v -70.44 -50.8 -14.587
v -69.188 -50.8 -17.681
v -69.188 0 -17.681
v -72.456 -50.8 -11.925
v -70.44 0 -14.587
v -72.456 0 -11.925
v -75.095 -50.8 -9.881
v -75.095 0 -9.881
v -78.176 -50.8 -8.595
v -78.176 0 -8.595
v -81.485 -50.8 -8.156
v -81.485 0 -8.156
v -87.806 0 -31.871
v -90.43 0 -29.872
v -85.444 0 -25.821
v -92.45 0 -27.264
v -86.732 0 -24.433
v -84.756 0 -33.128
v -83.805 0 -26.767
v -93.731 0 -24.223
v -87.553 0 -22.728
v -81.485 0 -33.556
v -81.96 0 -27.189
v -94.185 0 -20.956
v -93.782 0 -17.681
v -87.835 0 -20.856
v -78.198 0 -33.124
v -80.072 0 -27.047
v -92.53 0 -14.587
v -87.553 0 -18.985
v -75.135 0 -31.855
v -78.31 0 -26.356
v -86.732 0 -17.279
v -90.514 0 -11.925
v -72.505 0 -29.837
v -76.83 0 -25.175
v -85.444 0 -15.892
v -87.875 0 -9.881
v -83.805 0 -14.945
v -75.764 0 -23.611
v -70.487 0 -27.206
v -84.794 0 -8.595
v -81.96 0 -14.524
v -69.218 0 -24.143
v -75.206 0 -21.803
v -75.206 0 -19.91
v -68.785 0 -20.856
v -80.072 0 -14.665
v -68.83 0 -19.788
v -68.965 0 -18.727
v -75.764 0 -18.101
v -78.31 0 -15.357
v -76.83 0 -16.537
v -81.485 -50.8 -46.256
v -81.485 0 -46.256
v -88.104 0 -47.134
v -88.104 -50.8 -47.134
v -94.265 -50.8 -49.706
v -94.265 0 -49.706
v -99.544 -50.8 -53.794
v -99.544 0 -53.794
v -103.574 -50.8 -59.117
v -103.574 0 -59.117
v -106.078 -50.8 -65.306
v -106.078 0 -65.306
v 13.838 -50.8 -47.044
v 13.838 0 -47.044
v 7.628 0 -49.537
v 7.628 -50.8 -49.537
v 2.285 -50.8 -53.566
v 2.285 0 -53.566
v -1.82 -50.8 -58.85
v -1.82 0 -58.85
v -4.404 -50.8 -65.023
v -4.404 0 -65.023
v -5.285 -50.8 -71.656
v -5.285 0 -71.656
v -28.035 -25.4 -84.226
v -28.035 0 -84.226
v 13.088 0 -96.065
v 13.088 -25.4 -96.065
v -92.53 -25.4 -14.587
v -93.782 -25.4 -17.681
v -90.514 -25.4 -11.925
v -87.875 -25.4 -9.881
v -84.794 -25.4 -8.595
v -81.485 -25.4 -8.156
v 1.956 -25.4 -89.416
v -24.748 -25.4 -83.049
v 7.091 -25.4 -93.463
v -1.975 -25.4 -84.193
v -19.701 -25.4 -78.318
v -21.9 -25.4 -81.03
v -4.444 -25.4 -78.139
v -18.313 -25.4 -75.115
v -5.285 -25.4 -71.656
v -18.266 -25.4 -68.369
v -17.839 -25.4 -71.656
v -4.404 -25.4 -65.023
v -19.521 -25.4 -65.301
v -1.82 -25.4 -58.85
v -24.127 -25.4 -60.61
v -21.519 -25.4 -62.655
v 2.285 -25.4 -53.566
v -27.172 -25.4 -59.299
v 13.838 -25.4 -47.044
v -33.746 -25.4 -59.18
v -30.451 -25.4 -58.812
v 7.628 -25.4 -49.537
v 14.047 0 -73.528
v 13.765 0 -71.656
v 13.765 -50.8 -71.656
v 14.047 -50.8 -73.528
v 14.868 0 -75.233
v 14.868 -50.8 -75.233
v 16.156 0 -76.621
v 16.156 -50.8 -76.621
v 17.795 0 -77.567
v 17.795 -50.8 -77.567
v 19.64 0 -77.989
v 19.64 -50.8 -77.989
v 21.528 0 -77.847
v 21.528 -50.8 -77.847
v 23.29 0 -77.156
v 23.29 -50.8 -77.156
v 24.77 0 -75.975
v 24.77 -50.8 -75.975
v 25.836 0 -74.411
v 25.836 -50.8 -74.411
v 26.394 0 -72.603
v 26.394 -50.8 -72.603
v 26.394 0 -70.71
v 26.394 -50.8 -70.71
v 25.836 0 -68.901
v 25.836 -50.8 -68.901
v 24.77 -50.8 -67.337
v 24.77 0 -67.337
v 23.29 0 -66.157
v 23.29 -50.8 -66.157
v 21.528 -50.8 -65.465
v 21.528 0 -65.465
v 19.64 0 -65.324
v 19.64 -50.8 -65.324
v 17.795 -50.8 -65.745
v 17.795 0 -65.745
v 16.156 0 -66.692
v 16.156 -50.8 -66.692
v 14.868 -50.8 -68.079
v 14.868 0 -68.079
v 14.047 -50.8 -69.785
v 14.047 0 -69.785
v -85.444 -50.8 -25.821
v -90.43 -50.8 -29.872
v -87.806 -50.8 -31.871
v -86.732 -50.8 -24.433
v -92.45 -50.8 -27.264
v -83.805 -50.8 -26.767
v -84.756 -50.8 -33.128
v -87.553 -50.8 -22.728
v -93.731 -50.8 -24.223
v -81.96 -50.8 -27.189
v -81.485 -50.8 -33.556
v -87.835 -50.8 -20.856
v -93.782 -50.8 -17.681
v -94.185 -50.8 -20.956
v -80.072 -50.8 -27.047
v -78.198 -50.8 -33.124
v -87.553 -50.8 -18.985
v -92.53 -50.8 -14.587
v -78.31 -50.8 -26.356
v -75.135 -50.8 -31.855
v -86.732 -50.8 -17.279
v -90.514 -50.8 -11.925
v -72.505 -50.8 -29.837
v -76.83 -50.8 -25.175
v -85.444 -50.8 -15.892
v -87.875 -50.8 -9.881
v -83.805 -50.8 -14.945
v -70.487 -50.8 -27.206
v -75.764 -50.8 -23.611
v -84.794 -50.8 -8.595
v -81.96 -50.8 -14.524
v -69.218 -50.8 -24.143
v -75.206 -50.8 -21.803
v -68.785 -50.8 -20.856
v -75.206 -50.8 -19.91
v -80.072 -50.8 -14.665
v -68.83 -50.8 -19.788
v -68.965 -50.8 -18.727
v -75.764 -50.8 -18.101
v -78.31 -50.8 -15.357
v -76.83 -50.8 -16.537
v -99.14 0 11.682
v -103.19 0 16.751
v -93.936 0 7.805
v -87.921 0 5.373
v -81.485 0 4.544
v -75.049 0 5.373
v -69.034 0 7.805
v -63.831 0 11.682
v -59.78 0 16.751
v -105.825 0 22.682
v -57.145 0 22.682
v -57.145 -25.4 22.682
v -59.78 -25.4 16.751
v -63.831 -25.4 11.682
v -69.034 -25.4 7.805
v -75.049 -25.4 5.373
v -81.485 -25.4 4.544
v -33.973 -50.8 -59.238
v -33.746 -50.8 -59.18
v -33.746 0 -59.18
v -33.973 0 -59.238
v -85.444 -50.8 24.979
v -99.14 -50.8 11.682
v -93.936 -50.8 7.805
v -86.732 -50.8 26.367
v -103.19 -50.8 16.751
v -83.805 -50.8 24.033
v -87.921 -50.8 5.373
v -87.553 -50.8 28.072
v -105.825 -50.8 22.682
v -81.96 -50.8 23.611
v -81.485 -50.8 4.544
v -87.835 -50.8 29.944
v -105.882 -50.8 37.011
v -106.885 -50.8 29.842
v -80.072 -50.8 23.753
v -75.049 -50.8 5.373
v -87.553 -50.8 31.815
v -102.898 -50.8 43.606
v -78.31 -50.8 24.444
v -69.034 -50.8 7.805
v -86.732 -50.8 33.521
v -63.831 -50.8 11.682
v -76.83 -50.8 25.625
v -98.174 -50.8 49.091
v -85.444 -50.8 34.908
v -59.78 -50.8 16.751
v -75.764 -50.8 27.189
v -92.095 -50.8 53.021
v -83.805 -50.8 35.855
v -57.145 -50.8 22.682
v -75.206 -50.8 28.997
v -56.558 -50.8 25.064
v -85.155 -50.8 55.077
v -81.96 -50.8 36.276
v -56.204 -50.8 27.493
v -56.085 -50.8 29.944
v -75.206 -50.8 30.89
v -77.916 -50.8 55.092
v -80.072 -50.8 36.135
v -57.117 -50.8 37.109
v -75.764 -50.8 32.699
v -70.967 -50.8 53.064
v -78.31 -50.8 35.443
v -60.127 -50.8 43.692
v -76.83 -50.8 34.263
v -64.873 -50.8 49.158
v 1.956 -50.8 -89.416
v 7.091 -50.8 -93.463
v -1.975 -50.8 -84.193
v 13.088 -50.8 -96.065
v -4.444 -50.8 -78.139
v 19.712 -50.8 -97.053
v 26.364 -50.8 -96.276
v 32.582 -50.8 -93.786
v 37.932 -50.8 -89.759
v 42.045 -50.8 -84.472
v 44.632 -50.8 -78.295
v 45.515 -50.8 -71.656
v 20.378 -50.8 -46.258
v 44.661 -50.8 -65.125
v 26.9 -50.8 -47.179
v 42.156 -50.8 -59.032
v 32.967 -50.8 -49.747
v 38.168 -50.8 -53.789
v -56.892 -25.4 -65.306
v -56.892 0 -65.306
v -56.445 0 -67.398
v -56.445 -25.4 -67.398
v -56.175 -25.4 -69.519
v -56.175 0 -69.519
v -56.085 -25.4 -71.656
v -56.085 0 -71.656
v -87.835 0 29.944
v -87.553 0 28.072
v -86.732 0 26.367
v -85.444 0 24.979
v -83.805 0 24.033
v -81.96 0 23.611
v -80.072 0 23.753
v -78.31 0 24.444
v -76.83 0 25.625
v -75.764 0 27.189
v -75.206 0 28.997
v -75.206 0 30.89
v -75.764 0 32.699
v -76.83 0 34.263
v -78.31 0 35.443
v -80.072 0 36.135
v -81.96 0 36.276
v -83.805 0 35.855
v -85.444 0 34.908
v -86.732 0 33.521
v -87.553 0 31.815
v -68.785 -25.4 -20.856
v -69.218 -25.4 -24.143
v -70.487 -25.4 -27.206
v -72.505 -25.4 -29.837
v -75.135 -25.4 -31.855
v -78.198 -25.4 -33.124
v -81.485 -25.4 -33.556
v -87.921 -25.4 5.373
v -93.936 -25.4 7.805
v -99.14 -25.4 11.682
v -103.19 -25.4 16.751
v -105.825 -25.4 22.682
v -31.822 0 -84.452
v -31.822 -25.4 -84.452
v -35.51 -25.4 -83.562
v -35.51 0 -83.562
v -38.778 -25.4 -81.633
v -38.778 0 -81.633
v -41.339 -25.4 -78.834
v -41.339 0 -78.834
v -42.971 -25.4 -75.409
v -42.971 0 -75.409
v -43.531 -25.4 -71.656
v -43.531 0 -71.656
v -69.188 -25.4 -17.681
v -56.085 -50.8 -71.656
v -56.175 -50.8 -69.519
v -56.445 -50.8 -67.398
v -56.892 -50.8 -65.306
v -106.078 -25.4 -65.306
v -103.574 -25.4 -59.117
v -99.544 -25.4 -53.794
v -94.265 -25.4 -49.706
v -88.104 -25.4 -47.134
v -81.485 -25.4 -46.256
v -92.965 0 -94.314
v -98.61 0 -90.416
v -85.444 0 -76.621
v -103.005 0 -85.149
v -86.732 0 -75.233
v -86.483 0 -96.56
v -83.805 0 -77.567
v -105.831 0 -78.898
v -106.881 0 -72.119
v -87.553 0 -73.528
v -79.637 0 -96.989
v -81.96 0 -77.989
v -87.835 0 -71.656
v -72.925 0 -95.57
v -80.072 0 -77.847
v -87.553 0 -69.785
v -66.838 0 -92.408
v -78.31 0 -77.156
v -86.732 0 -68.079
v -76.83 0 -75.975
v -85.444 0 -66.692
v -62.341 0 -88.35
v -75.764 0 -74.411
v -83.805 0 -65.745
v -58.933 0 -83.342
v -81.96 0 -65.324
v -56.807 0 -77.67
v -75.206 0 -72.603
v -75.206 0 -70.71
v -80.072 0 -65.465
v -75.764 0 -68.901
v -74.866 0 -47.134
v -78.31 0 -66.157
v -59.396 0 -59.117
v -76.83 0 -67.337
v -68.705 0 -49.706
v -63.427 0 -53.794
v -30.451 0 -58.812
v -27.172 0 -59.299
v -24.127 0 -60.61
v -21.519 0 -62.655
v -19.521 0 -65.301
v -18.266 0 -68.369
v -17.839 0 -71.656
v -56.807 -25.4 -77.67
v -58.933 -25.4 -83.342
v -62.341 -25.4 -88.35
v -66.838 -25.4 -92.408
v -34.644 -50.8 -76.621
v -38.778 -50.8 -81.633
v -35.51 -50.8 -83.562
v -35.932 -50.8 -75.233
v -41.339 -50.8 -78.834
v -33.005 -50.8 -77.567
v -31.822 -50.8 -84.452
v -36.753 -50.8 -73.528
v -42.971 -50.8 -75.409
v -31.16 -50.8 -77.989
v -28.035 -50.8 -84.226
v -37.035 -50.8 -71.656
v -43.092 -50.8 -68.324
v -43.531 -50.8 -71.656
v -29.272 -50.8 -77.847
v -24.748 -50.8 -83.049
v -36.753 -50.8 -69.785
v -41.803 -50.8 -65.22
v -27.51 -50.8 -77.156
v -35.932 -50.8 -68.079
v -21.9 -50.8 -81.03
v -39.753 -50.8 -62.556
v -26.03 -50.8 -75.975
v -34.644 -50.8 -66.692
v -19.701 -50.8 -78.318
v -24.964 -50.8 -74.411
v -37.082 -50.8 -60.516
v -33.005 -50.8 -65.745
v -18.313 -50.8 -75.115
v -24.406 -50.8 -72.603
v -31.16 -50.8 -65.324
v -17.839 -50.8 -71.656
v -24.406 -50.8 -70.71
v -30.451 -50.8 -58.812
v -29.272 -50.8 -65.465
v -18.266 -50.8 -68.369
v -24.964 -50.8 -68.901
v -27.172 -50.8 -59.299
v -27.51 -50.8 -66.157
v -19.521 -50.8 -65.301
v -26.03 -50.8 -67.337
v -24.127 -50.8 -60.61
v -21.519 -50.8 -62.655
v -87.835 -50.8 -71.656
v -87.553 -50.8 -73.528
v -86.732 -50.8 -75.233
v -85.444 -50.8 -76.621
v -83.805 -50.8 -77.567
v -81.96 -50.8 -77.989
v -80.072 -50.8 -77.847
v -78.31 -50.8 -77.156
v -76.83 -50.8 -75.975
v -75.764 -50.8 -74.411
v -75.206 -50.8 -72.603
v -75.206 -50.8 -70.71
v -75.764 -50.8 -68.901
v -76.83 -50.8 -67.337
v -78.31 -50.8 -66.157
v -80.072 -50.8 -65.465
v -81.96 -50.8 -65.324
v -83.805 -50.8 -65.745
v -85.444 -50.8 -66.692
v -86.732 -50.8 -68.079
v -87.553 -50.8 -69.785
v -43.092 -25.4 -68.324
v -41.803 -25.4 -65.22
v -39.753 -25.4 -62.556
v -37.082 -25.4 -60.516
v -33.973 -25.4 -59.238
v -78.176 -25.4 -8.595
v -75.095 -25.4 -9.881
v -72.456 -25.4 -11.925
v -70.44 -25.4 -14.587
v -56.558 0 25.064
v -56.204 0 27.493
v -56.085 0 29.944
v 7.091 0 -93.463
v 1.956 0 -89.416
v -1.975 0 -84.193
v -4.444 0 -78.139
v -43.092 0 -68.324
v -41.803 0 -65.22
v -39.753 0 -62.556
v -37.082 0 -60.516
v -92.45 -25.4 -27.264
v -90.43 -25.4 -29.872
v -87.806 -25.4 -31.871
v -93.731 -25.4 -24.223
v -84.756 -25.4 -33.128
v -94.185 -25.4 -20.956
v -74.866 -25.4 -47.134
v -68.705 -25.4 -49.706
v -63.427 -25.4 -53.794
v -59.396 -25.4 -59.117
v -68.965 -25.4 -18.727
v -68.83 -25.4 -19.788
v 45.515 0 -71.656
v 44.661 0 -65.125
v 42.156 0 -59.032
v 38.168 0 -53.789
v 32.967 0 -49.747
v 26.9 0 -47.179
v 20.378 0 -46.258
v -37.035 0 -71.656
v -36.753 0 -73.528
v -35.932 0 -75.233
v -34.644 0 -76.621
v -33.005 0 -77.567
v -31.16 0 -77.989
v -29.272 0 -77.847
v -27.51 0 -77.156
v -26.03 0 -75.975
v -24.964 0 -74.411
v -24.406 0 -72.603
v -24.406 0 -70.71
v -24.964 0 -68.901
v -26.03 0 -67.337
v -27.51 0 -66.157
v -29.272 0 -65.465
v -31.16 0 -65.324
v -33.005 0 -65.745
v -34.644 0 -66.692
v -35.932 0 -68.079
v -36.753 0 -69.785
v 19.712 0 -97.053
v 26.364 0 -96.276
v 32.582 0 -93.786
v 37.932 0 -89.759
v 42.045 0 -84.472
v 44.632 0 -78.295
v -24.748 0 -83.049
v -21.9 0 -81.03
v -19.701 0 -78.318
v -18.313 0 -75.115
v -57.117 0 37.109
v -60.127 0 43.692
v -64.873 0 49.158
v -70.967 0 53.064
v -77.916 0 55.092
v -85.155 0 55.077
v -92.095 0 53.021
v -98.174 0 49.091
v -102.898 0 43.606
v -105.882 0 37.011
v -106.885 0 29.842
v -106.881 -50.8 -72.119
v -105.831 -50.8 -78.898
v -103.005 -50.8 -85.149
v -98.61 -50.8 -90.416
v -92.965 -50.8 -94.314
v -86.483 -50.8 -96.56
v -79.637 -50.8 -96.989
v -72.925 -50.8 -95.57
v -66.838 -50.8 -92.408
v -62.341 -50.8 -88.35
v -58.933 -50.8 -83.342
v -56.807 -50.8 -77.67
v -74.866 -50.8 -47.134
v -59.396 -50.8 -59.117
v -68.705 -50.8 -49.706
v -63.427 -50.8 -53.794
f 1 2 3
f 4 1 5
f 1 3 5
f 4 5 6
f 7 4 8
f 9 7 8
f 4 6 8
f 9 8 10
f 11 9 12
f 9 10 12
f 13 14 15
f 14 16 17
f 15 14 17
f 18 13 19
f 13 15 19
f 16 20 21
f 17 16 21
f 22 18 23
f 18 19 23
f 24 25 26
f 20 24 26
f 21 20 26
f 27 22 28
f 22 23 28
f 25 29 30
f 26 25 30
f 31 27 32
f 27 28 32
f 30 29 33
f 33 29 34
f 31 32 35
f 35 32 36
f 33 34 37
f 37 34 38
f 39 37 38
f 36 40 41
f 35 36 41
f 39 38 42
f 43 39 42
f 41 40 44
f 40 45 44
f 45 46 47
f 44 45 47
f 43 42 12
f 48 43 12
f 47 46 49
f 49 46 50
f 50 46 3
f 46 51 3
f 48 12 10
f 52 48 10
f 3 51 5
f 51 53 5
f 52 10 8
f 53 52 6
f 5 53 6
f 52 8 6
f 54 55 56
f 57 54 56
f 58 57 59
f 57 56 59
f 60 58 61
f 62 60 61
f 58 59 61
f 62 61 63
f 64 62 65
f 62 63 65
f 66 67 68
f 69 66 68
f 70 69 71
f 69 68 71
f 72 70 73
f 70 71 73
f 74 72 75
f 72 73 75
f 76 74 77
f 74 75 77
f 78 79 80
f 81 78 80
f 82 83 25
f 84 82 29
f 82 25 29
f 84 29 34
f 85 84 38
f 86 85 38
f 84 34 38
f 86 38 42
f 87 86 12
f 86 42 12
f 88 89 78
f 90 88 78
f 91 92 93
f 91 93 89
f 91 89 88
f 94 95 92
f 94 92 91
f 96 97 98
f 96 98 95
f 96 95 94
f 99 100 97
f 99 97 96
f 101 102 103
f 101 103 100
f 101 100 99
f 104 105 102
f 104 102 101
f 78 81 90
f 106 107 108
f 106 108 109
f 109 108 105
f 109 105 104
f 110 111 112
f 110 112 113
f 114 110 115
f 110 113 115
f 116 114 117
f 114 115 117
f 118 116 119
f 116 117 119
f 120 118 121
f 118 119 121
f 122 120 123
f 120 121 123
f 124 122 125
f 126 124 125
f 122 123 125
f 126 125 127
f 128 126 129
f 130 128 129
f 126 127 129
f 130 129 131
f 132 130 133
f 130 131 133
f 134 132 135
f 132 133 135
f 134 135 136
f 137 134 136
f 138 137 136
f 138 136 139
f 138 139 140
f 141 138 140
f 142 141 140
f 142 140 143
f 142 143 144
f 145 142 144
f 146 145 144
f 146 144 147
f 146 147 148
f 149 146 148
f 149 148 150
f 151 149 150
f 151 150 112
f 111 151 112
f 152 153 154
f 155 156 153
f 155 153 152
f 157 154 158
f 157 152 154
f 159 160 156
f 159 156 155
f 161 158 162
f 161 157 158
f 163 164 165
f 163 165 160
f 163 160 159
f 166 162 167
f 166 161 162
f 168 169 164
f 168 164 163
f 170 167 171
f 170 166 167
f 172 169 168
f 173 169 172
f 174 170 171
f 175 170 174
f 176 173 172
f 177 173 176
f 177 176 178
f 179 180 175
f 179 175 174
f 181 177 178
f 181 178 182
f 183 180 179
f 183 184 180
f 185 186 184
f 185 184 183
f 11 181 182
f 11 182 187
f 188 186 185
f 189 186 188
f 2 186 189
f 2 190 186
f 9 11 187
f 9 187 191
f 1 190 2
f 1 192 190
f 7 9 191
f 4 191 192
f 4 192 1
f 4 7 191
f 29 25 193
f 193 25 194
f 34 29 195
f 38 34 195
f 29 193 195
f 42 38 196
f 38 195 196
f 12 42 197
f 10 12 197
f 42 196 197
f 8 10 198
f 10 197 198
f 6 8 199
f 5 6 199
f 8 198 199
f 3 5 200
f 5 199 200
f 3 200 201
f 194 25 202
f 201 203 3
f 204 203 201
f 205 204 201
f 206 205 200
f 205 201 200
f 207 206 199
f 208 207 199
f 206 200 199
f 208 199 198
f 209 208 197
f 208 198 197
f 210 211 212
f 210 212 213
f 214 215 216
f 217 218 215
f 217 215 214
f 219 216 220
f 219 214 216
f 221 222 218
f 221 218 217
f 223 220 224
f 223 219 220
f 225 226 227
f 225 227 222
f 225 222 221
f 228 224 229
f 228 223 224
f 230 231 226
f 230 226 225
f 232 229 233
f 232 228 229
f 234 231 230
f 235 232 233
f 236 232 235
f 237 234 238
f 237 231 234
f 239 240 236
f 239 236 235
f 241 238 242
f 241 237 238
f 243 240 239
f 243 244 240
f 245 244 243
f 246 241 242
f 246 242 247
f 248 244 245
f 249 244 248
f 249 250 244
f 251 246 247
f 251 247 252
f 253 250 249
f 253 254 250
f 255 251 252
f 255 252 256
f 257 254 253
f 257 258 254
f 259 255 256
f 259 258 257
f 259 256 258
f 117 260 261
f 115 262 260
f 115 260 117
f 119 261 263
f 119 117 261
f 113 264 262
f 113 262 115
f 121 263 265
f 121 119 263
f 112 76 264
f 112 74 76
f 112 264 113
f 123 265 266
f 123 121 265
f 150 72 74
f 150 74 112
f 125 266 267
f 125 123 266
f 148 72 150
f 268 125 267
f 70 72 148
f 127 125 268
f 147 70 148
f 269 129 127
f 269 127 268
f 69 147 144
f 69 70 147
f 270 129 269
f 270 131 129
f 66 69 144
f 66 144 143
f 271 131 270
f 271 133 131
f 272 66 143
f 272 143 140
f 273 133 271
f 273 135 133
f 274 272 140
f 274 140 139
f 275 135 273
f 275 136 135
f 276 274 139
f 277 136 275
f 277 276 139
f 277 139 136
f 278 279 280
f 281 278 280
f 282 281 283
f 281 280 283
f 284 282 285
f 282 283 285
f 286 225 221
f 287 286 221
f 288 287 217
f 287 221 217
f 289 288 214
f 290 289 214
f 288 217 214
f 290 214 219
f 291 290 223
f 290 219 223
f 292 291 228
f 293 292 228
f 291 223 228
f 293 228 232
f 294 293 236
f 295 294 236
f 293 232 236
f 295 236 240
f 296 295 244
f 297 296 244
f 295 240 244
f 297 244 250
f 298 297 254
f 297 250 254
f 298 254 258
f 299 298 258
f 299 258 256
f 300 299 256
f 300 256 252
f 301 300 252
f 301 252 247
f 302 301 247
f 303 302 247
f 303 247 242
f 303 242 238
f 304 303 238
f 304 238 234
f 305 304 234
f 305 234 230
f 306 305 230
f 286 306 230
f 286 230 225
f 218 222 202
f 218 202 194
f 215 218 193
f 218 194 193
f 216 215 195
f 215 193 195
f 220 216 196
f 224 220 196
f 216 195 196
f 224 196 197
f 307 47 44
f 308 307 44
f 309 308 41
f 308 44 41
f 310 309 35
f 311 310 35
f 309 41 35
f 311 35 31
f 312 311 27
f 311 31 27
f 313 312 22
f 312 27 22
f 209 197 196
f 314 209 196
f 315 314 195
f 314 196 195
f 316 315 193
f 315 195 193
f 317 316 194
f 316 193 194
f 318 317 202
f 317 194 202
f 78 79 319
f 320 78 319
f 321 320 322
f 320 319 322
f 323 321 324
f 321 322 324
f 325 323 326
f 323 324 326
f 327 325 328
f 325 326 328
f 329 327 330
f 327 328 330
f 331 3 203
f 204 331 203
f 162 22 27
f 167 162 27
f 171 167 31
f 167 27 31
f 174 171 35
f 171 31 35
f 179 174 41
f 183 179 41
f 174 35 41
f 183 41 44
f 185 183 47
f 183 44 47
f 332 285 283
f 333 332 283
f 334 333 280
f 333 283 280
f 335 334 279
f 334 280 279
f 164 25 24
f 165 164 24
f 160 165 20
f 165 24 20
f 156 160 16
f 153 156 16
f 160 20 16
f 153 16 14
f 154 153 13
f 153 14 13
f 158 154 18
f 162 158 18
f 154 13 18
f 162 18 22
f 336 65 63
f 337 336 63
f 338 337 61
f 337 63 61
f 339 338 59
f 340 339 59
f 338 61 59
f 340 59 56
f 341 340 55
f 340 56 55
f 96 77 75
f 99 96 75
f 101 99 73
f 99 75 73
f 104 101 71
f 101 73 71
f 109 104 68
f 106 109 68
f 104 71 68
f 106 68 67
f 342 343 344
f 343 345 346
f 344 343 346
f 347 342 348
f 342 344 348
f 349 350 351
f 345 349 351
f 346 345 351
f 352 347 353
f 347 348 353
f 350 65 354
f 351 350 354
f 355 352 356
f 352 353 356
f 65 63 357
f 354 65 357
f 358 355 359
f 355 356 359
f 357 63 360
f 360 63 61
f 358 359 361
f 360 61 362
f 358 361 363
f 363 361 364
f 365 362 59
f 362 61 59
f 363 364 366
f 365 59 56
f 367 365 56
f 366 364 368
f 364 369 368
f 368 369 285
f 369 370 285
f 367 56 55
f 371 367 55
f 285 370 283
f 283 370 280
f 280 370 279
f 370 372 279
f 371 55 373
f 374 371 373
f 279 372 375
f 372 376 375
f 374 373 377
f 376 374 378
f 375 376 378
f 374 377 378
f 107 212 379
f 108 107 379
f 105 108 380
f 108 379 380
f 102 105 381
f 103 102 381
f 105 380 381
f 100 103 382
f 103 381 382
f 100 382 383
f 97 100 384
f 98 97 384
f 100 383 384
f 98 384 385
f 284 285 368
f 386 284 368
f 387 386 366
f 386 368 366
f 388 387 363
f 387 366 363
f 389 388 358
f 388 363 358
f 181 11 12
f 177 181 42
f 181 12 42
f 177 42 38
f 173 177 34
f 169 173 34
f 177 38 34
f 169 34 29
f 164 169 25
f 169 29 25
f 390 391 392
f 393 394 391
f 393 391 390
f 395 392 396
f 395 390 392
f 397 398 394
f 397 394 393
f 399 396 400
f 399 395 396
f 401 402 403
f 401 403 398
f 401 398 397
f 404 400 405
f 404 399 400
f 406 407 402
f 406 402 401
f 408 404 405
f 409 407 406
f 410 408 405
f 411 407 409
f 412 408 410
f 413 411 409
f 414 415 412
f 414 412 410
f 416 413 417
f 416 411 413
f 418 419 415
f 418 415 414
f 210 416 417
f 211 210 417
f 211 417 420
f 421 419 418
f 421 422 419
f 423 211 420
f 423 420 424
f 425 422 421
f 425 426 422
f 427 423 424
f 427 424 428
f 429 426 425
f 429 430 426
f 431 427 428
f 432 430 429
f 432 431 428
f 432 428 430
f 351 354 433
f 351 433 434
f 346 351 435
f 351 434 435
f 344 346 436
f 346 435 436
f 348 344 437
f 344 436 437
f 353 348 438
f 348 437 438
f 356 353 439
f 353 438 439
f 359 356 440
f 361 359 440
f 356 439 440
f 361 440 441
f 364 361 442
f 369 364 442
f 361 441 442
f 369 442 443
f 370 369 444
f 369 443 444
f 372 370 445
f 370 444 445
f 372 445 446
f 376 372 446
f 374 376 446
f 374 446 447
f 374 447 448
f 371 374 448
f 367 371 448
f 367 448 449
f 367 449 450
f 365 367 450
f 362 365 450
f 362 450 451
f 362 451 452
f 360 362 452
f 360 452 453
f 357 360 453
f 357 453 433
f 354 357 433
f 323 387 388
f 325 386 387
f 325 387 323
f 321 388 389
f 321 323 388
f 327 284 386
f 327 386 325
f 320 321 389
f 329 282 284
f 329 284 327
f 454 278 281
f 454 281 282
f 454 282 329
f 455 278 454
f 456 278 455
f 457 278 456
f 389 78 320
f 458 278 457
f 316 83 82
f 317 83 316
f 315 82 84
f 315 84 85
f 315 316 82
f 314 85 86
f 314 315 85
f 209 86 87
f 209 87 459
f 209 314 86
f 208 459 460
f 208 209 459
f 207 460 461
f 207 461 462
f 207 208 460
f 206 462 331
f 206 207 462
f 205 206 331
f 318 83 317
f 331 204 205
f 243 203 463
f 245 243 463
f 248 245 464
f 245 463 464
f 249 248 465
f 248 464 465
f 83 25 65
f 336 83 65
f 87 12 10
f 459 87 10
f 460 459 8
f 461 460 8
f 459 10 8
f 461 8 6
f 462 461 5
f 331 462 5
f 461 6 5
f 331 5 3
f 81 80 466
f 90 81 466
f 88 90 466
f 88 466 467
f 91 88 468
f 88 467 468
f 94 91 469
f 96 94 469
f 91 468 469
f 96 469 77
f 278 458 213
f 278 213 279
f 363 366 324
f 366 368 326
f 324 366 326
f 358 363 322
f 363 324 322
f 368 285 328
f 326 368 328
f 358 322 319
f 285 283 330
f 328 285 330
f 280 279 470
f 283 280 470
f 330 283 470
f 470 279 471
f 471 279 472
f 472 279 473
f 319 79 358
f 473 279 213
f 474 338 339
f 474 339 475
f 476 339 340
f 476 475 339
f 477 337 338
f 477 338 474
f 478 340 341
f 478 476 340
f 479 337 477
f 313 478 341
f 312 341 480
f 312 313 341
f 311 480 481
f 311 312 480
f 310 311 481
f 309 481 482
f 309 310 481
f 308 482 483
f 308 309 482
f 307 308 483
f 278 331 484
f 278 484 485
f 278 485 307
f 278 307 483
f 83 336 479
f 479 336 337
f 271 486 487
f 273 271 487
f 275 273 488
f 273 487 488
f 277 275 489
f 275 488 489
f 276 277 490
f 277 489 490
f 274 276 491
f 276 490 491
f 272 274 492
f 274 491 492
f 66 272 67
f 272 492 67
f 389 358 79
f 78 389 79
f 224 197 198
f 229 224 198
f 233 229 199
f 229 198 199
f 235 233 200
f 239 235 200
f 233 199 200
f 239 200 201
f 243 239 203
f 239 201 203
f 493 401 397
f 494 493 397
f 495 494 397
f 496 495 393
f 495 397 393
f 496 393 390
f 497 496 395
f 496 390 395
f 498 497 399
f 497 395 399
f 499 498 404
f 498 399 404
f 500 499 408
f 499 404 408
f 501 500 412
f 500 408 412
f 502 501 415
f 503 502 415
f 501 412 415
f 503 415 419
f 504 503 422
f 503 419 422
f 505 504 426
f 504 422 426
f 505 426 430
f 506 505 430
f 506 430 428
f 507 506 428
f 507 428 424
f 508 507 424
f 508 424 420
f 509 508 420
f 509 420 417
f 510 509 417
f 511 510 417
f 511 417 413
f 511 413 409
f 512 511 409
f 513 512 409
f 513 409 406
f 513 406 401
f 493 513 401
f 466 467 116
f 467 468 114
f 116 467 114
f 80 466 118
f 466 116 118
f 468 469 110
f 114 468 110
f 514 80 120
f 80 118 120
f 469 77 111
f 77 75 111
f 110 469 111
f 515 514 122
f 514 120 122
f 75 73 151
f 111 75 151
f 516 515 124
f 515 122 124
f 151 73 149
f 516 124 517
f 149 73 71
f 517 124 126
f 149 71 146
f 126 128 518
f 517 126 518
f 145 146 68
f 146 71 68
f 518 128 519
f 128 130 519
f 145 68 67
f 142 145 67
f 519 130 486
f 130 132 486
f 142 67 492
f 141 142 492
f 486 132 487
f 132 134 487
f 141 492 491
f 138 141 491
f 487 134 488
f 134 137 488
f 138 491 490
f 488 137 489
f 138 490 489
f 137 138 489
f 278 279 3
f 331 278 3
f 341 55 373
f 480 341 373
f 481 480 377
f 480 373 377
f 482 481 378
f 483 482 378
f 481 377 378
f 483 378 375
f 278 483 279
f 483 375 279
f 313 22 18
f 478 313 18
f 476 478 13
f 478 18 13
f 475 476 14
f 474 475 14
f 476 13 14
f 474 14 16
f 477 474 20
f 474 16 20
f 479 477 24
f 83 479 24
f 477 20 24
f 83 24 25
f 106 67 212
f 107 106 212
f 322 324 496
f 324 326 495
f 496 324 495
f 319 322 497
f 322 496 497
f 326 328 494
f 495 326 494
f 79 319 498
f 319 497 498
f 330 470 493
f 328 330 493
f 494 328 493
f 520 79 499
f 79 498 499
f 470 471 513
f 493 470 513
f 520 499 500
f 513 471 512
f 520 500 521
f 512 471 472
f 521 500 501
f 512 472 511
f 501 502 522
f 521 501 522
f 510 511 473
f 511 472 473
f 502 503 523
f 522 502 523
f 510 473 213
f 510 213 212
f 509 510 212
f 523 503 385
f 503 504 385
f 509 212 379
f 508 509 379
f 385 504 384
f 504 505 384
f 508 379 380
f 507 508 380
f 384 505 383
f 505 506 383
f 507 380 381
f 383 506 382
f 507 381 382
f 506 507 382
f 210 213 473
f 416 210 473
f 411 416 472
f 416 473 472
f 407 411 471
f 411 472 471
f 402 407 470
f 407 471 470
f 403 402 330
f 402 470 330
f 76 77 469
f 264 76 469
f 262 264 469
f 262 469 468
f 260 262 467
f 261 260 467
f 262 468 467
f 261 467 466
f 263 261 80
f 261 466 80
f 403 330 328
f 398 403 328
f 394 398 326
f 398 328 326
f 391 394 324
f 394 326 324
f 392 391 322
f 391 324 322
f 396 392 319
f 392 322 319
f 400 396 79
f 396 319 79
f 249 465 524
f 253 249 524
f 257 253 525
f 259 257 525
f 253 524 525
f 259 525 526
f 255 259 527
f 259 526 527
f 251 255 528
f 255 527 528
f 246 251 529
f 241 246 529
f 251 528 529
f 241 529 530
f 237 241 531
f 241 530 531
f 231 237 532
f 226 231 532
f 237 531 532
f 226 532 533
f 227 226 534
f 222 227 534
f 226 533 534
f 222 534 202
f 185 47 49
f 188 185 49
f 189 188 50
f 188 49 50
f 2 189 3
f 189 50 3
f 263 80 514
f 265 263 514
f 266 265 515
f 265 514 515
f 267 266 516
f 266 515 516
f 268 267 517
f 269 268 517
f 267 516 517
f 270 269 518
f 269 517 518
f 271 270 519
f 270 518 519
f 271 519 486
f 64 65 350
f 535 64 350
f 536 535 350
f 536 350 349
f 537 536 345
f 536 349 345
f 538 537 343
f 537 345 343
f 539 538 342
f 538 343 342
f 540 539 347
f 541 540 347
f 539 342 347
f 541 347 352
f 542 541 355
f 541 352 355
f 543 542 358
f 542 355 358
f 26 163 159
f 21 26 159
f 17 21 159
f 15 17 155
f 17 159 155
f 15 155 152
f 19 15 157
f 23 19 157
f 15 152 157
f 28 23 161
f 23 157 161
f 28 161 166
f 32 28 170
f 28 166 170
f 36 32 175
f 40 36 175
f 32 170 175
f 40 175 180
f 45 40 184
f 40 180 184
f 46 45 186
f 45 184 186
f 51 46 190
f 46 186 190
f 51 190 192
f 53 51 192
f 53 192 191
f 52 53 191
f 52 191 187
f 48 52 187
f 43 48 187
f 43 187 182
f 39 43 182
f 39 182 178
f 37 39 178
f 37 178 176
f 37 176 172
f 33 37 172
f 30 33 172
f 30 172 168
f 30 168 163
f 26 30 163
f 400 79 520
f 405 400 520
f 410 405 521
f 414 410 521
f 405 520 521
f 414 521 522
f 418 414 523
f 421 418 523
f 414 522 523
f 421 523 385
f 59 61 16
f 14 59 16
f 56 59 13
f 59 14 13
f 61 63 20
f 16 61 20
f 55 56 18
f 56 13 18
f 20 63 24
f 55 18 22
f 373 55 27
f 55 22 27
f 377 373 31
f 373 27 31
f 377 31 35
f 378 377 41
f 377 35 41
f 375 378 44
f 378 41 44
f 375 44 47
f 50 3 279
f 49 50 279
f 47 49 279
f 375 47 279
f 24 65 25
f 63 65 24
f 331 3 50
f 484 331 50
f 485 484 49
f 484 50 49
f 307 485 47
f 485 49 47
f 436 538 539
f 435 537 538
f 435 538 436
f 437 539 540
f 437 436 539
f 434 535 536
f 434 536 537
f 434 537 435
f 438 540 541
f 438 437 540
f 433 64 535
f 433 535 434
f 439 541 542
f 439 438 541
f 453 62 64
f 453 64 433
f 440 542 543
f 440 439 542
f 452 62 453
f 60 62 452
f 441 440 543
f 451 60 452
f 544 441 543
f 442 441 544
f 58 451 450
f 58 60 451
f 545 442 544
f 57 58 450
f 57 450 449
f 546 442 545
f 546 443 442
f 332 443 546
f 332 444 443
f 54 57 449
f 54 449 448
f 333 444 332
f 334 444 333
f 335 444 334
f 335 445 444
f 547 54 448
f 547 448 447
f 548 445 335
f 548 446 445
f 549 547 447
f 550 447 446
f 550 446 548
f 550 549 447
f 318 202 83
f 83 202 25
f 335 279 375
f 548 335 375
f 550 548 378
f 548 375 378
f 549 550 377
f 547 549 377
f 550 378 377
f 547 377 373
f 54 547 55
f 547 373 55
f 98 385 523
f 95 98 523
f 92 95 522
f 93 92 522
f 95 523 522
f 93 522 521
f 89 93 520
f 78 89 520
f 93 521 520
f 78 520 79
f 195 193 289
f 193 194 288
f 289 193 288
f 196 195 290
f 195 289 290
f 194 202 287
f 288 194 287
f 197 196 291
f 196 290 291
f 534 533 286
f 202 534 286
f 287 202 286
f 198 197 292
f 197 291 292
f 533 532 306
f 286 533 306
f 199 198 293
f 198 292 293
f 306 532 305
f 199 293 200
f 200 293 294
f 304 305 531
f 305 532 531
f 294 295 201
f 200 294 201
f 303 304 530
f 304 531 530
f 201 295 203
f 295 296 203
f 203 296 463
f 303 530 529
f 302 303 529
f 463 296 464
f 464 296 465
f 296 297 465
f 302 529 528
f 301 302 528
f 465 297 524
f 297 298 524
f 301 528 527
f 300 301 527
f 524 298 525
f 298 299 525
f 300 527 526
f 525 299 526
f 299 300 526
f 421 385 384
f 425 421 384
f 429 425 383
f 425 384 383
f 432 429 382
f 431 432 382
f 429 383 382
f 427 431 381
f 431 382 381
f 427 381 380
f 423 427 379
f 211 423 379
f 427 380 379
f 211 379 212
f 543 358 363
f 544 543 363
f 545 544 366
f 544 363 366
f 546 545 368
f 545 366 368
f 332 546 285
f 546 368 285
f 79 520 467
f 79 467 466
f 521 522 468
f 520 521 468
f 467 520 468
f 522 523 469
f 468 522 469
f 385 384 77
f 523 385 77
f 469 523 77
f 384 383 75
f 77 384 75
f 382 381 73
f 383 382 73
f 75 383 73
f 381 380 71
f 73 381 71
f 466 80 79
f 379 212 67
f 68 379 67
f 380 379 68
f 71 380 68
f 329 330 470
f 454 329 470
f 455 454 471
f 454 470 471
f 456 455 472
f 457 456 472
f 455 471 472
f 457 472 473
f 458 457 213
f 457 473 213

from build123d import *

# Parameters (mm, degrees)
F1_DEPTH = 50.8
F2_DEPTH = 25.4
F3_D     = 12.7
F3_2_D   = 12.7
F3_3_D   = 12.7
F3_4_D   = 12.7
F3_5_D   = 12.7


with BuildPart() as f1:
    # F0 (on Front) → F1 (new body)
    with BuildSketch(Plane.XZ):
        with BuildLine():
            ThreePointArc((-81.4850498225, 4.5437239793), (-66.3077558729, 9.5768452697), (-57.1453565147, 22.6815390684))
            ThreePointArc((-57.1453565147, 22.6815390684), (-56.3515243036, 26.2741334039), (-56.0850498225, 29.9437239793))
            ThreePointArc((-56.0850498225, 29.9437239793), (-85.1546403978, 55.0772494982), (-105.8247431304, 22.6815390684))
            ThreePointArc((-105.8247431304, 22.6815390684), (-96.6623437721, 9.5768452697), (-81.4850498225, 4.5437239793))
        make_face()
    extrude(amount=F1_DEPTH)

    # F3 (through all)
    with Locations(Plane(origin=(0, 0, 0), x_dir=(1, 0, 0), z_dir=(0, 1, 0))):
        with Locations((-81.4850498225, -29.9437239793), (-81.4850498225, 20.8562760207), (-81.4850498225, 71.6562741589), (-30.6850498225, 71.6562741589), (20.1149483157, 71.6562741589)):
            Hole(F3_D / 2)


with BuildPart() as f1b:
    # F0 (on Front) → F1, piece 2 (new body)
    with BuildSketch(Plane.XZ):
        with BuildLine():
            Line((-56.0850498225, -71.6562741589), (-81.4850498225, -71.6562741589))
            Line((-81.4850498225, -71.6562741589), (-81.4850498225, -46.2562741589))
            ThreePointArc((-81.4850498225, -46.2562741589), (-97.0393095942, -51.5758109432), (-106.0784940108, -65.3062739262))
            ThreePointArc((-106.0784940108, -65.3062739262), (-95.9194886513, -92.5562018071), (-66.8378468362, -92.4076462744))
            ThreePointArc((-66.8378468362, -92.4076462744), (-58.9328996384, -83.3421854231), (-56.0850498225, -71.6562741589))
        make_face()
        with BuildLine():
            Line((-81.4850498225, -46.2562741589), (-81.4850498225, -71.6562741589))
            Line((-81.4850498225, -71.6562741589), (-56.0850498225, -71.6562741589))
            ThreePointArc((-56.0850498225, -71.6562741589), (-56.2874955525, -68.4557650106), (-56.8916056342, -65.3062739262))
            ThreePointArc((-56.8916056342, -65.3062739262), (-65.9307900508, -51.5758109432), (-81.4850498225, -46.2562741589))
        make_face()
    extrude(amount=F1_DEPTH)

    # F3#2 (through all)
    with Locations(Plane(origin=(0, 0, 0), x_dir=(1, 0, 0), z_dir=(0, 1, 0))):
        with Locations((-81.4850498225, -29.9437239793), (-81.4850498225, 20.8562760207), (-81.4850498225, 71.6562741589), (-30.6850498225, 71.6562741589), (20.1149483157, 71.6562741589)):
            Hole(F3_2_D / 2)


with BuildPart() as f1c:
    # F0 (on Front) → F1, piece 3 (new body)
    with BuildSketch(Plane.XZ):
        with BuildLine():
            ThreePointArc((-5.2850516843, -71.6562741589), (-0.1784275618, -86.9317085389), (13.0880896934, -96.0649459356))
            ThreePointArc((13.0880896934, -96.0649459356), (35.3903826957, -91.9496500363), (45.5149483157, -71.6562741589))
            ThreePointArc((45.5149483157, -71.6562741589), (35.6989606694, -51.5988925013), (13.8378964291, -47.044110101))
            ThreePointArc((13.8378964291, -47.044110101), (0.057566658, -56.0722618052), (-5.2850516843, -71.6562741589))
        make_face()
    extrude(amount=F1_DEPTH)

    # F3#3 (through all)
    with Locations(Plane(origin=(0, 0, 0), x_dir=(1, 0, 0), z_dir=(0, 1, 0))):
        with Locations((-81.4850498225, -29.9437239793), (-81.4850498225, 20.8562760207), (-81.4850498225, 71.6562741589), (-30.6850498225, 71.6562741589), (20.1149483157, 71.6562741589)):
            Hole(F3_3_D / 2)


with BuildPart() as f1d:
    # F0 (on Front) → F1, piece 4 (new body)
    with BuildSketch(Plane.XZ):
        with BuildLine():
            ThreePointArc((-93.7817719167, -17.6812759044), (-91.5252814303, -28.6334059066), (-81.4850498225, -33.5562760207))
            Line((-81.4850498225, -33.5562760207), (-81.4850498225, -20.8562760207))
            Line((-81.4850498225, -20.8562760207), (-81.4850498225, -8.1562760207))
            ThreePointArc((-81.4850498225, -8.1562760207), (-89.2621797083, -10.8160444129), (-93.7817719167, -17.6812759044))
        make_face()
        with BuildLine():
            Line((-81.4850498225, -20.8562760207), (-81.4850498225, -33.5562760207))
            ThreePointArc((-81.4850498225, -33.5562760207), (-72.5047937014, -29.8365321418), (-68.7850498225, -20.8562760207))
            ThreePointArc((-68.7850498225, -20.8562760207), (-68.8862726875, -19.2560214466), (-69.1883277283, -17.6812759044))
            ThreePointArc((-69.1883277283, -17.6812759044), (-73.7079199367, -10.8160444129), (-81.4850498225, -8.1562760207))
            Line((-81.4850498225, -8.1562760207), (-81.4850498225, -20.8562760207))
        make_face()
    extrude(amount=F1_DEPTH)

    # F3#4 (through all)
    with Locations(Plane(origin=(0, 0, 0), x_dir=(1, 0, 0), z_dir=(0, 1, 0))):
        with Locations((-81.4850498225, -29.9437239793), (-81.4850498225, 20.8562760207), (-81.4850498225, 71.6562741589), (-30.6850498225, 71.6562741589), (20.1149483157, 71.6562741589)):
            Hole(F3_4_D / 2)


with BuildPart() as f1e:
    # F0 (on Front) → F1, piece 5 (new body)
    with BuildSketch(Plane.XZ):
        with BuildLine():
            ThreePointArc((-33.9732944715, -59.2378093359), (-40.865252019, -63.8208223741), (-43.5314820678, -71.6562741589))
            Line((-43.5314820678, -71.6562741589), (-30.6850498225, -71.6562741589))
            Line((-30.6850498225, -71.6562741589), (-17.8386175772, -71.6562741589))
            ThreePointArc((-17.8386175772, -71.6562741589), (-22.7569683581, -61.5480425763), (-33.7459673809, -59.1798321527))
            Line((-33.7459673809, -59.1798321527), (-33.9732944715, -59.2378093359))
        make_face()
        with BuildLine():
            Line((-30.6850498225, -71.6562741589), (-43.5314820678, -71.6562741589))
            ThreePointArc((-43.5314820678, -71.6562741589), (-38.7777633216, -81.6331879931), (-28.0347577237, -84.2263486704))
            ThreePointArc((-28.0347577237, -84.2263486704), (-20.7081359883, -79.748987658), (-17.8386175772, -71.6562741589))
            Line((-17.8386175772, -71.6562741589), (-30.6850498225, -71.6562741589))
        make_face()
    extrude(amount=F1_DEPTH)

    # F3#5 (through all)
    with Locations(Plane(origin=(0, 0, 0), x_dir=(1, 0, 0), z_dir=(0, 1, 0))):
        with Locations((-81.4850498225, -29.9437239793), (-81.4850498225, 20.8562760207), (-81.4850498225, 71.6562741589), (-30.6850498225, 71.6562741589), (20.1149483157, 71.6562741589)):
            Hole(F3_5_D / 2)


with BuildPart() as f2:
    # F0 (on Front) → F2 (new body)
    with BuildSketch(Plane.XZ):
        with BuildLine():
            Line((-105.8247431304, 22.6815390684), (-93.7817719167, -17.6812759044))
            ThreePointArc((-93.7817719167, -17.6812759044), (-89.2621797083, -10.8160444129), (-81.4850498225, -8.1562760207))
            Line((-81.4850498225, -8.1562760207), (-81.4850498225, 4.5437239793))
            ThreePointArc((-81.4850498225, 4.5437239793), (-96.6623437721, 9.5768452697), (-105.8247431304, 22.6815390684))
        make_face()
        with BuildLine():
            ThreePointArc((-81.4850498225, -8.1562760207), (-73.7079199367, -10.8160444129), (-69.1883277283, -17.6812759044))
            Line((-69.1883277283, -17.6812759044), (-57.1453565147, 22.6815390684))
            ThreePointArc((-57.1453565147, 22.6815390684), (-66.3077558729, 9.5768452697), (-81.4850498225, 4.5437239793))
            Line((-81.4850498225, 4.5437239793), (-81.4850498225, -8.1562760207))
        make_face()
    extrude(amount=F2_DEPTH)


with BuildPart() as f2b:
    # F0 (on Front) → F2, piece 2 (new body)
    with BuildSketch(Plane.XZ):
        with BuildLine():
            ThreePointArc((-106.0784940108, -65.3062739262), (-97.0393095942, -51.5758109432), (-81.4850498225, -46.2562741589))
            Line((-81.4850498225, -46.2562741589), (-81.4850498225, -33.5562760207))
            ThreePointArc((-81.4850498225, -33.5562760207), (-91.5252814303, -28.6334059066), (-93.7817719167, -17.6812759044))
            Line((-93.7817719167, -17.6812759044), (-106.0784940108, -65.3062739262))
        make_face()
        with BuildLine():
            Line((-81.4850498225, -33.5562760207), (-81.4850498225, -46.2562741589))
            ThreePointArc((-81.4850498225, -46.2562741589), (-65.9307900508, -51.5758109432), (-56.8916056342, -65.3062739262))
            Line((-56.8916056342, -65.3062739262), (-69.1883277283, -17.6812759044))
            ThreePointArc((-69.1883277283, -17.6812759044), (-68.8862726875, -19.2560214466), (-68.7850498225, -20.8562760207))
            ThreePointArc((-68.7850498225, -20.8562760207), (-72.5047937014, -29.8365321418), (-81.4850498225, -33.5562760207))
        make_face()
    extrude(amount=F2_DEPTH)


with BuildPart() as f2c:
    # F0 (on Front) → F2, piece 3 (new body)
    with BuildSketch(Plane.XZ):
        with BuildLine():
            ThreePointArc((-56.8916056342, -65.3062739262), (-56.2874955525, -68.4557650106), (-56.0850498225, -71.6562741589))
            Line((-56.0850498225, -71.6562741589), (-43.5314820678, -71.6562741589))
            ThreePointArc((-43.5314820678, -71.6562741589), (-40.865252019, -63.8208223741), (-33.9732944715, -59.2378093359))
            Line((-33.9732944715, -59.2378093359), (-56.8916056342, -65.3062739262))
        make_face()
        with BuildLine():
            Line((-43.5314820678, -71.6562741589), (-56.0850498225, -71.6562741589))
            ThreePointArc((-56.0850498225, -71.6562741589), (-58.9328996384, -83.3421854231), (-66.8378468362, -92.4076462744))
            Line((-66.8378468362, -92.4076462744), (-28.0347577237, -84.2263486704))
            ThreePointArc((-28.0347577237, -84.2263486704), (-38.7777633216, -81.6331879931), (-43.5314820678, -71.6562741589))
        make_face()
    extrude(amount=F2_DEPTH)


with BuildPart() as f2d:
    # F0 (on Front) → F2, piece 4 (new body)
    with BuildSketch(Plane.XZ):
        with BuildLine():
            ThreePointArc((-33.7459673809, -59.1798321527), (-22.7569683581, -61.5480425763), (-17.8386175772, -71.6562741589))
            Line((-17.8386175772, -71.6562741589), (-5.2850516843, -71.6562741589))
            ThreePointArc((-5.2850516843, -71.6562741589), (0.057566658, -56.0722618052), (13.8378964291, -47.044110101))
            Line((13.8378964291, -47.044110101), (-33.7459673809, -59.1798321527))
        make_face()
        with BuildLine():
            ThreePointArc((-17.8386175772, -71.6562741589), (-20.7081359883, -79.748987658), (-28.0347577237, -84.2263486704))
            Line((-28.0347577237, -84.2263486704), (13.0880896934, -96.0649459356))
            ThreePointArc((13.0880896934, -96.0649459356), (-0.1784275618, -86.9317085389), (-5.2850516843, -71.6562741589))
            Line((-5.2850516843, -71.6562741589), (-17.8386175772, -71.6562741589))
        make_face()
    extrude(amount=F2_DEPTH)


solid = Compound([f1.part, f1b.part, f1c.part, f1d.part, f1e.part, f2.part, f2b.part, f2c.part, f2d.part])
